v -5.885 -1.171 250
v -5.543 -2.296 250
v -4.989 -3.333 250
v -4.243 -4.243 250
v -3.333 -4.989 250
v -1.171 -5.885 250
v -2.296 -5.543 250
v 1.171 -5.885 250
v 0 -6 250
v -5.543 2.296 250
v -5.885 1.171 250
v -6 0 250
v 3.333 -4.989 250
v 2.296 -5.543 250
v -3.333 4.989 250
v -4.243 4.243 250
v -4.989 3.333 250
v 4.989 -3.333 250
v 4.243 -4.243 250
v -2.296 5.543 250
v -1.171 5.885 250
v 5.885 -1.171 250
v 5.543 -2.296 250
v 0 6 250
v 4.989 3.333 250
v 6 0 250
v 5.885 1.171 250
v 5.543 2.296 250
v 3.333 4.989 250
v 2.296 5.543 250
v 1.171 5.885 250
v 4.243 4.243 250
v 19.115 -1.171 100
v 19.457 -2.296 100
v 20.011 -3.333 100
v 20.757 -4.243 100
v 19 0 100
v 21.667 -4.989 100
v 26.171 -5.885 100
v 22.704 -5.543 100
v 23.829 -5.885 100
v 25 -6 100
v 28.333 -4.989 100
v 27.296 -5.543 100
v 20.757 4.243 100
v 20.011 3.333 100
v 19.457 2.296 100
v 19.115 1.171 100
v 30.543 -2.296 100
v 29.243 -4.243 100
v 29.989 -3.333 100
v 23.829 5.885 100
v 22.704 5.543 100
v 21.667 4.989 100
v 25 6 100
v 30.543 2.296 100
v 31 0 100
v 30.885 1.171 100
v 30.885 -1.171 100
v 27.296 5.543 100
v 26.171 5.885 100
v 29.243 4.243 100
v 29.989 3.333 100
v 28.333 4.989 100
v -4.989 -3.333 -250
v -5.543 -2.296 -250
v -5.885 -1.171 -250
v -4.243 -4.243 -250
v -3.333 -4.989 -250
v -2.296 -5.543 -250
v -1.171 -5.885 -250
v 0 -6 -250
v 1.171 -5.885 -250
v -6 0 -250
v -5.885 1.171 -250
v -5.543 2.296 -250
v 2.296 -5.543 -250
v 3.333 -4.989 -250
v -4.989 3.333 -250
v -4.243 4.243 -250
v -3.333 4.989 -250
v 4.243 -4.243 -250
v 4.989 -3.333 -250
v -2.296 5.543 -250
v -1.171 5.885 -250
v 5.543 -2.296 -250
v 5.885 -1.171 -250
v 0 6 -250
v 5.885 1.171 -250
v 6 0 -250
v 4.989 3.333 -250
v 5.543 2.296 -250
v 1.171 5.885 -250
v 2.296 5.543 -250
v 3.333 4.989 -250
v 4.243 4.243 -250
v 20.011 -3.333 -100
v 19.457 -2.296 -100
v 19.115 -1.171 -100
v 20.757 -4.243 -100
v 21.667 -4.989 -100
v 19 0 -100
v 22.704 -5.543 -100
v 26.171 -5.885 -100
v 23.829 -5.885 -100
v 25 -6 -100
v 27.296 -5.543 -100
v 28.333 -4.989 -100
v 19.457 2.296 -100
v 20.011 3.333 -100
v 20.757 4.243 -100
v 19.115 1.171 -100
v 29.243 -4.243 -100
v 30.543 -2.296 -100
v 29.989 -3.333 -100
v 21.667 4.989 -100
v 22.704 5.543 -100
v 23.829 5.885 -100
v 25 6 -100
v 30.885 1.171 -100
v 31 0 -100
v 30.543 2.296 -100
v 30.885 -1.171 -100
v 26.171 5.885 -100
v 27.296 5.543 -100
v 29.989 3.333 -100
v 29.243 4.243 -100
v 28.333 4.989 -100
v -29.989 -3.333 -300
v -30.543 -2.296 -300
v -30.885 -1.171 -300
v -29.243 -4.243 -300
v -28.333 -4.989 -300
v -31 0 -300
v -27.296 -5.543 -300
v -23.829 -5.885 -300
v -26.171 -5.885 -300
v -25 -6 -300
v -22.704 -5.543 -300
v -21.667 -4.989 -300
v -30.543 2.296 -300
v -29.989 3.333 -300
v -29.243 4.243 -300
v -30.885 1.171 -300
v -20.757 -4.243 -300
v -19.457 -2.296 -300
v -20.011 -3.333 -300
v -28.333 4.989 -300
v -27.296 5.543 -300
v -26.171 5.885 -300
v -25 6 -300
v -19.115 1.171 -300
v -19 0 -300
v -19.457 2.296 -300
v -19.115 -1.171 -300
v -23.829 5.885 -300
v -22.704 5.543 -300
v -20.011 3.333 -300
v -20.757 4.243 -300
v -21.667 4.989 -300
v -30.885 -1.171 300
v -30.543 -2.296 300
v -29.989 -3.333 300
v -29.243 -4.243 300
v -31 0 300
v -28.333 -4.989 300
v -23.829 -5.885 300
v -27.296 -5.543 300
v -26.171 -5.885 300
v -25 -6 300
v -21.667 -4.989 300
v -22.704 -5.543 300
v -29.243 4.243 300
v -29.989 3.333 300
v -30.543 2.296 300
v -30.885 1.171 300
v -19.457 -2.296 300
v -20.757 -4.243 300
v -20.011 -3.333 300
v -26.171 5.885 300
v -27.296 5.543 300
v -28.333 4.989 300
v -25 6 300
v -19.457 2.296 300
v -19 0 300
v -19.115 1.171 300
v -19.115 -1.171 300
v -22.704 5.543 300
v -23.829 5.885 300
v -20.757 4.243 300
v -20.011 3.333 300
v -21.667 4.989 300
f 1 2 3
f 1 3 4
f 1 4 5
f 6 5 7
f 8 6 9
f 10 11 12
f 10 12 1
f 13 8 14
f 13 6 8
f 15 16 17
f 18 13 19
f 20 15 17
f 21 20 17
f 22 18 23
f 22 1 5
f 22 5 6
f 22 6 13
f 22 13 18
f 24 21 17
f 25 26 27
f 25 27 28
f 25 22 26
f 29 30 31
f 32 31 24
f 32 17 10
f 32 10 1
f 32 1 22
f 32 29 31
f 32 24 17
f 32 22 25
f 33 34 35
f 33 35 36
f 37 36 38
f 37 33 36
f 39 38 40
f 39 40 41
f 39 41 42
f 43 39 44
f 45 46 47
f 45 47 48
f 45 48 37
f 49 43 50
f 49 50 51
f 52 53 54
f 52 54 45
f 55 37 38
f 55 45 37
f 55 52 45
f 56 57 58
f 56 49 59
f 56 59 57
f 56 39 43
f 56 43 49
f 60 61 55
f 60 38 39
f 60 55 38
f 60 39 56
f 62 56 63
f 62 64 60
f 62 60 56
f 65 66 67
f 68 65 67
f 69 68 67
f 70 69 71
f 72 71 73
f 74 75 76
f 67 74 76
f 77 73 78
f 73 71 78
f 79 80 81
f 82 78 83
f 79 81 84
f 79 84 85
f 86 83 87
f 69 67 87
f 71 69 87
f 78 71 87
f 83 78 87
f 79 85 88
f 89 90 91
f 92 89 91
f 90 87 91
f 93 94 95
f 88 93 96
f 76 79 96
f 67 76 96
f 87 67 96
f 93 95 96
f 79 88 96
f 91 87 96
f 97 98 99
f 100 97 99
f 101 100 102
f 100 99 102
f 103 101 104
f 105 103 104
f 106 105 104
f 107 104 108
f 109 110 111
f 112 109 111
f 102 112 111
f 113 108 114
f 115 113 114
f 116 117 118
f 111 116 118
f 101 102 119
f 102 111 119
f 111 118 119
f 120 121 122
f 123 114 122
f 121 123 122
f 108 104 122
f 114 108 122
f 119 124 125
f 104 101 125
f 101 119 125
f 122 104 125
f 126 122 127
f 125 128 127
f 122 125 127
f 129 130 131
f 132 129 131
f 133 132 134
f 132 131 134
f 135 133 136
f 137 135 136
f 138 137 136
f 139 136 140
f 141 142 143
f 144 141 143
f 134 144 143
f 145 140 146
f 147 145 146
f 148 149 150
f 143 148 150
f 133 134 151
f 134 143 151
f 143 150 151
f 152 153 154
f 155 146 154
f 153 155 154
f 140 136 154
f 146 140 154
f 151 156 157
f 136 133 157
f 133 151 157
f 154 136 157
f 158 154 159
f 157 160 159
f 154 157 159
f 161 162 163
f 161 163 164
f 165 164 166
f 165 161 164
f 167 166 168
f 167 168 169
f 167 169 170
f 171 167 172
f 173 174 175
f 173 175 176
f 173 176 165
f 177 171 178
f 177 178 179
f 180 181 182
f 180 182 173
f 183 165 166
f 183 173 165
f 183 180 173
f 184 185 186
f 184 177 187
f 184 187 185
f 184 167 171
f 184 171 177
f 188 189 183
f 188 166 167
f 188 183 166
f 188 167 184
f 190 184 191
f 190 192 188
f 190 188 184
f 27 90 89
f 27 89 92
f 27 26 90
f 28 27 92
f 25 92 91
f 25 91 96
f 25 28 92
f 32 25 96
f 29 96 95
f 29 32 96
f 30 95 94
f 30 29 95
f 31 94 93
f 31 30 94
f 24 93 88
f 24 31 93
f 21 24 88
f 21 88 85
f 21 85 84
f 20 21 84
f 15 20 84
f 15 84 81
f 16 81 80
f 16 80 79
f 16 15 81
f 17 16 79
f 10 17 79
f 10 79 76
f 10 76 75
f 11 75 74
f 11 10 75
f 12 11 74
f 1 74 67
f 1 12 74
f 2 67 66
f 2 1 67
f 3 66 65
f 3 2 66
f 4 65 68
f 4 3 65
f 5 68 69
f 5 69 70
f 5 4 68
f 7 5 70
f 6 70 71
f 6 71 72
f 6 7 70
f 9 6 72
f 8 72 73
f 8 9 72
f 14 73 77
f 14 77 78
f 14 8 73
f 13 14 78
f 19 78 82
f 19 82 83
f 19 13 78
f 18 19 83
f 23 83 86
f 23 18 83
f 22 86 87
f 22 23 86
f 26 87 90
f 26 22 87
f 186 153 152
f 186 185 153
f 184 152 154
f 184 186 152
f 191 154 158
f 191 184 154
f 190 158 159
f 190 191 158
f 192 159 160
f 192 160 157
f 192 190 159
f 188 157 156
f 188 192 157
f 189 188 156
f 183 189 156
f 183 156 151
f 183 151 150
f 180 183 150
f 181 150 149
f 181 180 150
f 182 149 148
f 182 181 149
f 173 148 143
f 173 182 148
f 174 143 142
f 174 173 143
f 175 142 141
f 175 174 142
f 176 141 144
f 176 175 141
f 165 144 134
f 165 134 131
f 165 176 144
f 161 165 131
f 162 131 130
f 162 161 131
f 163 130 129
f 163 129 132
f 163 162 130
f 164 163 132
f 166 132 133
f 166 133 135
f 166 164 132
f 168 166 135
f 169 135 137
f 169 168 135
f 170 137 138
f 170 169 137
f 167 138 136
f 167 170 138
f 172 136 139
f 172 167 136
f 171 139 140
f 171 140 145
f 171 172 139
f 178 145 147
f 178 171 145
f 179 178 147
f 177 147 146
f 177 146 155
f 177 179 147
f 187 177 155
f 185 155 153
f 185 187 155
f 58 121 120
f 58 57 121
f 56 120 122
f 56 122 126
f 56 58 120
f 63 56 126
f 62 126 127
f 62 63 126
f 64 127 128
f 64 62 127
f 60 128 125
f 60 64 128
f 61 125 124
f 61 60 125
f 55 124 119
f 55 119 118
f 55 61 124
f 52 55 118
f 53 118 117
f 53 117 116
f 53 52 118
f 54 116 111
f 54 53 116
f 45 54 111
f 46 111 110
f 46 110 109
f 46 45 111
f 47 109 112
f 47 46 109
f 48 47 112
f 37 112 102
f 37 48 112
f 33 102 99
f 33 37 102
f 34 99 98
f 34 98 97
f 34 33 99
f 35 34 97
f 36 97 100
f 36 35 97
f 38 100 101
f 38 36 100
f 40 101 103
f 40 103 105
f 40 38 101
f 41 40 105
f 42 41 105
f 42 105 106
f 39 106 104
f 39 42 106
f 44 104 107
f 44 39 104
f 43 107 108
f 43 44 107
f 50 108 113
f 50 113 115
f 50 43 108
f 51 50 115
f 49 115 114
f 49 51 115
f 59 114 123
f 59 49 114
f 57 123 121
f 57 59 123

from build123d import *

# Parameters (mm, degrees)
F3_R     = 6
F4_DEPTH = 300
F5_DEPTH = 250
F6_DEPTH = 100


with BuildPart() as f4:
    # F3 (on Top) → F4 (new body, symmetric)
    with BuildSketch(Plane.XY):
        with Locations((-25, 0)):
            Circle(F3_R)
    extrude(amount=F4_DEPTH, both=True)


with BuildPart() as f5:
    # F3 (on Top) → F5 (new body, symmetric)
    with BuildSketch(Plane.XY):
        Circle(F3_R)
    extrude(amount=F5_DEPTH, both=True)


with BuildPart() as f6:
    # F3 (on Top) → F6 (new body, symmetric)
    with BuildSketch(Plane.XY):
        with Locations((25, 0)):
            Circle(F3_R)
    extrude(amount=F6_DEPTH, both=True)


solid = Compound([f4.part, f5.part, f6.part])
